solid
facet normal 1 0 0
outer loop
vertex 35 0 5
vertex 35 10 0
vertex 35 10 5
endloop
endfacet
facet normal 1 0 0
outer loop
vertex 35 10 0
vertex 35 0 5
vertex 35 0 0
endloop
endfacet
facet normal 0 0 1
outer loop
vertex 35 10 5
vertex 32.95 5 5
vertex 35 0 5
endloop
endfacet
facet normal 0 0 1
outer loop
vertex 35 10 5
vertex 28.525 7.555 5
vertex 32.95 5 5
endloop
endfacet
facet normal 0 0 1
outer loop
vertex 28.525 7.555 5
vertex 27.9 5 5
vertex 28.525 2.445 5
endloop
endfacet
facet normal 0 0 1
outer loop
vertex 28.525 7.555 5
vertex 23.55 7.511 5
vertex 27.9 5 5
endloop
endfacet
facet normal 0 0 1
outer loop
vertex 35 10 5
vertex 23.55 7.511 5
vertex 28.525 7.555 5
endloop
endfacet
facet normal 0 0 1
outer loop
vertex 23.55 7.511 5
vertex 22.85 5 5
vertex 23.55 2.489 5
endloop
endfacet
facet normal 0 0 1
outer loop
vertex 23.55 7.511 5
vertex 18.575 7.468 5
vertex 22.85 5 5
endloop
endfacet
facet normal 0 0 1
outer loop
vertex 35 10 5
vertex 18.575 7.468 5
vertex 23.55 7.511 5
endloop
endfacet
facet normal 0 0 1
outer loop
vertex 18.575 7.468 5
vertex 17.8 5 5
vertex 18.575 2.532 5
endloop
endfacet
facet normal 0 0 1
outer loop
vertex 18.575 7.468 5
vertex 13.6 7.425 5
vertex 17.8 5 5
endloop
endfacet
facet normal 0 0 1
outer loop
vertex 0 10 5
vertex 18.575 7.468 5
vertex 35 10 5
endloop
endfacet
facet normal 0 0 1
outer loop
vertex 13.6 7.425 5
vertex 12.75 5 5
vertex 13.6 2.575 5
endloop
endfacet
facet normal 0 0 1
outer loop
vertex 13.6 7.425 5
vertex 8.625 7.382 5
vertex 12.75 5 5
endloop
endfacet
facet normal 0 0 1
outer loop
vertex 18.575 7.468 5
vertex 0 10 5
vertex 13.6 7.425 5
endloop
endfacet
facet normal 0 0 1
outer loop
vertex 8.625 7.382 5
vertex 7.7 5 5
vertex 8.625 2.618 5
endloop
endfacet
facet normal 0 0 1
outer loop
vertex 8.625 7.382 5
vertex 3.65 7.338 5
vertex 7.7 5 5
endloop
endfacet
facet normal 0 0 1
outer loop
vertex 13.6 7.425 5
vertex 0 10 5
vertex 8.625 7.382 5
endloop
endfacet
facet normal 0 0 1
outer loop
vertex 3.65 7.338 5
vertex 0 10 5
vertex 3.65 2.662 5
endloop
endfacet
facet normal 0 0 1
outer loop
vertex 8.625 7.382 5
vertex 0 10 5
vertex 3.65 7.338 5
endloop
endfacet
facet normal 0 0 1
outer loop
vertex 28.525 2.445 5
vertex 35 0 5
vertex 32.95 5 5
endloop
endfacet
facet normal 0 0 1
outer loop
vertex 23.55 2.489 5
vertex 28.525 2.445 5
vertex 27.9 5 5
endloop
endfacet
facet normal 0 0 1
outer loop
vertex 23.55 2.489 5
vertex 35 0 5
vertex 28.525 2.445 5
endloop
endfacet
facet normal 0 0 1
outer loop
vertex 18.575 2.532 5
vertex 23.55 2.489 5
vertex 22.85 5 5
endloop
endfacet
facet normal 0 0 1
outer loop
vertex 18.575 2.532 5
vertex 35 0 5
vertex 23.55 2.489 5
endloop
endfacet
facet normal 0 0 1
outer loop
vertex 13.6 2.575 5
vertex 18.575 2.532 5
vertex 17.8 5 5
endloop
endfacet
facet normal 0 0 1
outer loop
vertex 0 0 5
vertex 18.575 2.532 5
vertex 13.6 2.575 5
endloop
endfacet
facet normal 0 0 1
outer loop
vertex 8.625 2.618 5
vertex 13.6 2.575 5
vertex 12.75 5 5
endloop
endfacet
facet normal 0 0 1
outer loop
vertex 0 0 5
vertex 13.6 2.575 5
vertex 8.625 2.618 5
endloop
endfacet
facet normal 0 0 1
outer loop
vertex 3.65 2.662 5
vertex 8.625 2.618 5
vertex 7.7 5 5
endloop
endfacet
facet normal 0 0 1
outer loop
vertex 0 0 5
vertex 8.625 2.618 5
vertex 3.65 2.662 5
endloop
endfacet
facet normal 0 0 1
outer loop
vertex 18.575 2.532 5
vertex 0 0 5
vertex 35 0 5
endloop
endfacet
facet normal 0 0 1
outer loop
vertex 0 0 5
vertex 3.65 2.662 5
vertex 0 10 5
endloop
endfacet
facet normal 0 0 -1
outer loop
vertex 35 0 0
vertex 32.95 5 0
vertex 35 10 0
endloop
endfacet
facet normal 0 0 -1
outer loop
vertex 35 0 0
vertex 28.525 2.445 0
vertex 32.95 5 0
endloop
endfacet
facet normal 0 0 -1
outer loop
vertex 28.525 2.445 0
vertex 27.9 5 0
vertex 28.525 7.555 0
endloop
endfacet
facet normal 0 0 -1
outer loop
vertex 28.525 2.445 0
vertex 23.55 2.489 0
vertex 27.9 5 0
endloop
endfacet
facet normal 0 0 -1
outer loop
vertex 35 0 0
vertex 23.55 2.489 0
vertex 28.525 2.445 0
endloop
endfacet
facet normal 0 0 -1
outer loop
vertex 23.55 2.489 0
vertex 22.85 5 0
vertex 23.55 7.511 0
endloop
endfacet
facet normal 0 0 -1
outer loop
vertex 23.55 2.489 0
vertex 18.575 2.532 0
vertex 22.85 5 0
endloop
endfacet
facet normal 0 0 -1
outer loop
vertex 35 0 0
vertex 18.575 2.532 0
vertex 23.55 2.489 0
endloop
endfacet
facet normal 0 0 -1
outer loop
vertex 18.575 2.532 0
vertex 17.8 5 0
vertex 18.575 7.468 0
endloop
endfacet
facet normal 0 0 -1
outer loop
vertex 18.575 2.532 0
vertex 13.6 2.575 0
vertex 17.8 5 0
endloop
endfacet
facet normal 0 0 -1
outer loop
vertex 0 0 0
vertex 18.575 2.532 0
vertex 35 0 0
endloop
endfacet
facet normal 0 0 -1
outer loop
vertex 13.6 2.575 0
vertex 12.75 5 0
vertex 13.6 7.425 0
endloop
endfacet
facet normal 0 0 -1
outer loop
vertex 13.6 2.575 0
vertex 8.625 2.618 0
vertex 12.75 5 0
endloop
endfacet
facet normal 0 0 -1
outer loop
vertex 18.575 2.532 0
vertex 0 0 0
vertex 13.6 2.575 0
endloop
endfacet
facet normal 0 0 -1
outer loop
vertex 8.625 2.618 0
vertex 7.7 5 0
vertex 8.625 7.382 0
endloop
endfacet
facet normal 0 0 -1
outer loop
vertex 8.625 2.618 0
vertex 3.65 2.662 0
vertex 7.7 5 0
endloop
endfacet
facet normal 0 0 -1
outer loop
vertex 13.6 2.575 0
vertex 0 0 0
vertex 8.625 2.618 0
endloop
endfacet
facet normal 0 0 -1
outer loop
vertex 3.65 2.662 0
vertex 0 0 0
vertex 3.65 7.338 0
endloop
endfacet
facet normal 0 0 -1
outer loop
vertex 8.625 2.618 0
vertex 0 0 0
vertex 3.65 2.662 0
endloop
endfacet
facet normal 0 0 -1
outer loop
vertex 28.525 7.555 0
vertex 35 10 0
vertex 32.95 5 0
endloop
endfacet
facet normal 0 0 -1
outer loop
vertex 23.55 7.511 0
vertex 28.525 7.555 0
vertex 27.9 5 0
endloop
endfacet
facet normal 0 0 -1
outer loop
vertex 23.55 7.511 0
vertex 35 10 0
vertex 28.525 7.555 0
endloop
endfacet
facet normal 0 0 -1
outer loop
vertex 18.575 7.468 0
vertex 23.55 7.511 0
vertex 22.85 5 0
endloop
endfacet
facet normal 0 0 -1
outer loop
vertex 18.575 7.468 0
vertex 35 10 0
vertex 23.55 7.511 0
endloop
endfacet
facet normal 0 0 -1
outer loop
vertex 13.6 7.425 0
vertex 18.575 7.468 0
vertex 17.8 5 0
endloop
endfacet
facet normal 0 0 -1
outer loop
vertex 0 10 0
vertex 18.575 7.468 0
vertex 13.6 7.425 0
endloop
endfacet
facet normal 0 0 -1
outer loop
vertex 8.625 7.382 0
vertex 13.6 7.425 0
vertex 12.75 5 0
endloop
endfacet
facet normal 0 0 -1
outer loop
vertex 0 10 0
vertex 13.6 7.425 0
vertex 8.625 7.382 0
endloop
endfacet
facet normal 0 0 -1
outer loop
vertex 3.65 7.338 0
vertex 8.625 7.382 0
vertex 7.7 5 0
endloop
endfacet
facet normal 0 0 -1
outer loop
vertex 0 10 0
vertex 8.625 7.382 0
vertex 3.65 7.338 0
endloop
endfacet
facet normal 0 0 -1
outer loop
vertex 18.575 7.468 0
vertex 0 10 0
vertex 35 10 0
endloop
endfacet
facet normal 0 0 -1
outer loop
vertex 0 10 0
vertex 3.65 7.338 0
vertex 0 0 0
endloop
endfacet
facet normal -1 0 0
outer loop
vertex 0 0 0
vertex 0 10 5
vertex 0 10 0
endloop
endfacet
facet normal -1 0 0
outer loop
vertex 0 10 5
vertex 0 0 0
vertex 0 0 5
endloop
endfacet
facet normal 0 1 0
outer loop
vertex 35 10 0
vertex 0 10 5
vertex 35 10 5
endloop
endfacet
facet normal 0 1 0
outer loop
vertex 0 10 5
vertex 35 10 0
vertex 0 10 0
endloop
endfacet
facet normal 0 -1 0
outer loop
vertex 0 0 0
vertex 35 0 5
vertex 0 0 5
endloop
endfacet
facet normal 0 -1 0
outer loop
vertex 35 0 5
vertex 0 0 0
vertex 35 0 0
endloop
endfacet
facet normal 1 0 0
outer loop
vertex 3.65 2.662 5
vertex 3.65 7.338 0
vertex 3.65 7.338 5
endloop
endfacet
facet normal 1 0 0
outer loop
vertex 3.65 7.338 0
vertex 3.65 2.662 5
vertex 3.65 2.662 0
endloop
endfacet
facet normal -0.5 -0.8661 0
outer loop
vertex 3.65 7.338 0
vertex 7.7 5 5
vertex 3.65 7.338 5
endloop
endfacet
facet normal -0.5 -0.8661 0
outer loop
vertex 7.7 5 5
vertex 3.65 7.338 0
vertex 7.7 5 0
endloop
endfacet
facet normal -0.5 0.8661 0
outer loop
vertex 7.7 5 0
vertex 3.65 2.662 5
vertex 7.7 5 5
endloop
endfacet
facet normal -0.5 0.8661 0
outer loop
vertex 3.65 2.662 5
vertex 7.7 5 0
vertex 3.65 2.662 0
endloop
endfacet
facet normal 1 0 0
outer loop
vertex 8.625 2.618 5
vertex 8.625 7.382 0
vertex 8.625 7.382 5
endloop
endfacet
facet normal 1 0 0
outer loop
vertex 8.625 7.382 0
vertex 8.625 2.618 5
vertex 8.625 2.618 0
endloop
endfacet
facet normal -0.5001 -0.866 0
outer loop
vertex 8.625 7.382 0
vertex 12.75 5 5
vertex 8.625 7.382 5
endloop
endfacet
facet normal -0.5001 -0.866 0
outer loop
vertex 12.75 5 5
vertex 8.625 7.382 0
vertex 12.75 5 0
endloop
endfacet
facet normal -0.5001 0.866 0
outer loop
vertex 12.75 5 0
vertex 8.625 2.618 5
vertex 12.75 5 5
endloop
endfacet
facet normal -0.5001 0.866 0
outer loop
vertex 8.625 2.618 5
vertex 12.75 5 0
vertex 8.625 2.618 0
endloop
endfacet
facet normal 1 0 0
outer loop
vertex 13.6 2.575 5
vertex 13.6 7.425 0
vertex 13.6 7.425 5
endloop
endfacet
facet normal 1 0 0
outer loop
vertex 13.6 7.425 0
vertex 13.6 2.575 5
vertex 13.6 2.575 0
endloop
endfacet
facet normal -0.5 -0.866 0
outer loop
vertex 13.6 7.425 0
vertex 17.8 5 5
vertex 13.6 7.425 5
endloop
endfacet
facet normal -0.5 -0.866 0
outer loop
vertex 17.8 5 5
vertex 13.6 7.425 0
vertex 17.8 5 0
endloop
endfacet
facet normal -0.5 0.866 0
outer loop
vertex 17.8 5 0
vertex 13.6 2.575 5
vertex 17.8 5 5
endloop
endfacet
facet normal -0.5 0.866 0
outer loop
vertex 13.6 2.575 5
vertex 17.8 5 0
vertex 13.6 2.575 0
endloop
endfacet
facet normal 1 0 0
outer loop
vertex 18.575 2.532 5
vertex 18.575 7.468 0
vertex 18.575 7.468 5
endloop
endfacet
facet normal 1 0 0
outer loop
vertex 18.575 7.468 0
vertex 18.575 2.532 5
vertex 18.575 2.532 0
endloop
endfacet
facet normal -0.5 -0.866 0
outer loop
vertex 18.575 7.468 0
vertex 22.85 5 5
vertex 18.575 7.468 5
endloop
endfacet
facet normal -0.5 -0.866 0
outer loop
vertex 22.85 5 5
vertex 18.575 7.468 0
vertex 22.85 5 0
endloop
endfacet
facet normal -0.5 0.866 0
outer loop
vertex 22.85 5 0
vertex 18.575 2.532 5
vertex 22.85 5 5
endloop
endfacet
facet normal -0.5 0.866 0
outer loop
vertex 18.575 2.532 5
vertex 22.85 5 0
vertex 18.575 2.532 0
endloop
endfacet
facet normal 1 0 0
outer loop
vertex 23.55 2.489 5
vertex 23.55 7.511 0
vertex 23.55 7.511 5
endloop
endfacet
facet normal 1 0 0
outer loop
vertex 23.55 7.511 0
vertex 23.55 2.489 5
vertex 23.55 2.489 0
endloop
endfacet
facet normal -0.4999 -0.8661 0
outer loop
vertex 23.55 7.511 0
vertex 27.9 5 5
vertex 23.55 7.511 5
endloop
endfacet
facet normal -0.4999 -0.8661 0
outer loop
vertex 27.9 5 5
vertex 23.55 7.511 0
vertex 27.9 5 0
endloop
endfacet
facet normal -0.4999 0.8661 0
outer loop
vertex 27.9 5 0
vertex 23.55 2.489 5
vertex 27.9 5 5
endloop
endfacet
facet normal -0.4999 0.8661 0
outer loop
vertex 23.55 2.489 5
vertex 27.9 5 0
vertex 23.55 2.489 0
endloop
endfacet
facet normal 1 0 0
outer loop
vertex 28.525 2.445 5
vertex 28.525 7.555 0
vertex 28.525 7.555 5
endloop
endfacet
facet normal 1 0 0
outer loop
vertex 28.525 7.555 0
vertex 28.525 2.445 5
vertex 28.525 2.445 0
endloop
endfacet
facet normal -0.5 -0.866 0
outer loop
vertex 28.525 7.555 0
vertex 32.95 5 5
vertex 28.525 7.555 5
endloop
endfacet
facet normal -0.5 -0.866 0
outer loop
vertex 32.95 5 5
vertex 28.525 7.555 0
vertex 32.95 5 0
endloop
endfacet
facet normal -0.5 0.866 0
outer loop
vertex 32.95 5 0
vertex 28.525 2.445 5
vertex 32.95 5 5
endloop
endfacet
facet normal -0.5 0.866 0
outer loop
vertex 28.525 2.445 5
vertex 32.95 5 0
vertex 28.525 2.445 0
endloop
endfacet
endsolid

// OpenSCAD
$fn=3;

m = 5.5;

difference(){
    cube([35,10,5]);
    translate([5,5,0])cylinder(d=m-0.1,h=10,center=true);
    translate([10,5,0])cylinder(d=m,h=10,center=true);
    translate([15,5,0])cylinder(d=m+.1,h=10,center=true);
    translate([20,5,0])cylinder(d=m+.2,h=10,center=true);
    translate([25,5,0])cylinder(d=m+.3,h=10,center=true);
    translate([30,5,0])cylinder(d=m+.4,h=10,center=true);
}
